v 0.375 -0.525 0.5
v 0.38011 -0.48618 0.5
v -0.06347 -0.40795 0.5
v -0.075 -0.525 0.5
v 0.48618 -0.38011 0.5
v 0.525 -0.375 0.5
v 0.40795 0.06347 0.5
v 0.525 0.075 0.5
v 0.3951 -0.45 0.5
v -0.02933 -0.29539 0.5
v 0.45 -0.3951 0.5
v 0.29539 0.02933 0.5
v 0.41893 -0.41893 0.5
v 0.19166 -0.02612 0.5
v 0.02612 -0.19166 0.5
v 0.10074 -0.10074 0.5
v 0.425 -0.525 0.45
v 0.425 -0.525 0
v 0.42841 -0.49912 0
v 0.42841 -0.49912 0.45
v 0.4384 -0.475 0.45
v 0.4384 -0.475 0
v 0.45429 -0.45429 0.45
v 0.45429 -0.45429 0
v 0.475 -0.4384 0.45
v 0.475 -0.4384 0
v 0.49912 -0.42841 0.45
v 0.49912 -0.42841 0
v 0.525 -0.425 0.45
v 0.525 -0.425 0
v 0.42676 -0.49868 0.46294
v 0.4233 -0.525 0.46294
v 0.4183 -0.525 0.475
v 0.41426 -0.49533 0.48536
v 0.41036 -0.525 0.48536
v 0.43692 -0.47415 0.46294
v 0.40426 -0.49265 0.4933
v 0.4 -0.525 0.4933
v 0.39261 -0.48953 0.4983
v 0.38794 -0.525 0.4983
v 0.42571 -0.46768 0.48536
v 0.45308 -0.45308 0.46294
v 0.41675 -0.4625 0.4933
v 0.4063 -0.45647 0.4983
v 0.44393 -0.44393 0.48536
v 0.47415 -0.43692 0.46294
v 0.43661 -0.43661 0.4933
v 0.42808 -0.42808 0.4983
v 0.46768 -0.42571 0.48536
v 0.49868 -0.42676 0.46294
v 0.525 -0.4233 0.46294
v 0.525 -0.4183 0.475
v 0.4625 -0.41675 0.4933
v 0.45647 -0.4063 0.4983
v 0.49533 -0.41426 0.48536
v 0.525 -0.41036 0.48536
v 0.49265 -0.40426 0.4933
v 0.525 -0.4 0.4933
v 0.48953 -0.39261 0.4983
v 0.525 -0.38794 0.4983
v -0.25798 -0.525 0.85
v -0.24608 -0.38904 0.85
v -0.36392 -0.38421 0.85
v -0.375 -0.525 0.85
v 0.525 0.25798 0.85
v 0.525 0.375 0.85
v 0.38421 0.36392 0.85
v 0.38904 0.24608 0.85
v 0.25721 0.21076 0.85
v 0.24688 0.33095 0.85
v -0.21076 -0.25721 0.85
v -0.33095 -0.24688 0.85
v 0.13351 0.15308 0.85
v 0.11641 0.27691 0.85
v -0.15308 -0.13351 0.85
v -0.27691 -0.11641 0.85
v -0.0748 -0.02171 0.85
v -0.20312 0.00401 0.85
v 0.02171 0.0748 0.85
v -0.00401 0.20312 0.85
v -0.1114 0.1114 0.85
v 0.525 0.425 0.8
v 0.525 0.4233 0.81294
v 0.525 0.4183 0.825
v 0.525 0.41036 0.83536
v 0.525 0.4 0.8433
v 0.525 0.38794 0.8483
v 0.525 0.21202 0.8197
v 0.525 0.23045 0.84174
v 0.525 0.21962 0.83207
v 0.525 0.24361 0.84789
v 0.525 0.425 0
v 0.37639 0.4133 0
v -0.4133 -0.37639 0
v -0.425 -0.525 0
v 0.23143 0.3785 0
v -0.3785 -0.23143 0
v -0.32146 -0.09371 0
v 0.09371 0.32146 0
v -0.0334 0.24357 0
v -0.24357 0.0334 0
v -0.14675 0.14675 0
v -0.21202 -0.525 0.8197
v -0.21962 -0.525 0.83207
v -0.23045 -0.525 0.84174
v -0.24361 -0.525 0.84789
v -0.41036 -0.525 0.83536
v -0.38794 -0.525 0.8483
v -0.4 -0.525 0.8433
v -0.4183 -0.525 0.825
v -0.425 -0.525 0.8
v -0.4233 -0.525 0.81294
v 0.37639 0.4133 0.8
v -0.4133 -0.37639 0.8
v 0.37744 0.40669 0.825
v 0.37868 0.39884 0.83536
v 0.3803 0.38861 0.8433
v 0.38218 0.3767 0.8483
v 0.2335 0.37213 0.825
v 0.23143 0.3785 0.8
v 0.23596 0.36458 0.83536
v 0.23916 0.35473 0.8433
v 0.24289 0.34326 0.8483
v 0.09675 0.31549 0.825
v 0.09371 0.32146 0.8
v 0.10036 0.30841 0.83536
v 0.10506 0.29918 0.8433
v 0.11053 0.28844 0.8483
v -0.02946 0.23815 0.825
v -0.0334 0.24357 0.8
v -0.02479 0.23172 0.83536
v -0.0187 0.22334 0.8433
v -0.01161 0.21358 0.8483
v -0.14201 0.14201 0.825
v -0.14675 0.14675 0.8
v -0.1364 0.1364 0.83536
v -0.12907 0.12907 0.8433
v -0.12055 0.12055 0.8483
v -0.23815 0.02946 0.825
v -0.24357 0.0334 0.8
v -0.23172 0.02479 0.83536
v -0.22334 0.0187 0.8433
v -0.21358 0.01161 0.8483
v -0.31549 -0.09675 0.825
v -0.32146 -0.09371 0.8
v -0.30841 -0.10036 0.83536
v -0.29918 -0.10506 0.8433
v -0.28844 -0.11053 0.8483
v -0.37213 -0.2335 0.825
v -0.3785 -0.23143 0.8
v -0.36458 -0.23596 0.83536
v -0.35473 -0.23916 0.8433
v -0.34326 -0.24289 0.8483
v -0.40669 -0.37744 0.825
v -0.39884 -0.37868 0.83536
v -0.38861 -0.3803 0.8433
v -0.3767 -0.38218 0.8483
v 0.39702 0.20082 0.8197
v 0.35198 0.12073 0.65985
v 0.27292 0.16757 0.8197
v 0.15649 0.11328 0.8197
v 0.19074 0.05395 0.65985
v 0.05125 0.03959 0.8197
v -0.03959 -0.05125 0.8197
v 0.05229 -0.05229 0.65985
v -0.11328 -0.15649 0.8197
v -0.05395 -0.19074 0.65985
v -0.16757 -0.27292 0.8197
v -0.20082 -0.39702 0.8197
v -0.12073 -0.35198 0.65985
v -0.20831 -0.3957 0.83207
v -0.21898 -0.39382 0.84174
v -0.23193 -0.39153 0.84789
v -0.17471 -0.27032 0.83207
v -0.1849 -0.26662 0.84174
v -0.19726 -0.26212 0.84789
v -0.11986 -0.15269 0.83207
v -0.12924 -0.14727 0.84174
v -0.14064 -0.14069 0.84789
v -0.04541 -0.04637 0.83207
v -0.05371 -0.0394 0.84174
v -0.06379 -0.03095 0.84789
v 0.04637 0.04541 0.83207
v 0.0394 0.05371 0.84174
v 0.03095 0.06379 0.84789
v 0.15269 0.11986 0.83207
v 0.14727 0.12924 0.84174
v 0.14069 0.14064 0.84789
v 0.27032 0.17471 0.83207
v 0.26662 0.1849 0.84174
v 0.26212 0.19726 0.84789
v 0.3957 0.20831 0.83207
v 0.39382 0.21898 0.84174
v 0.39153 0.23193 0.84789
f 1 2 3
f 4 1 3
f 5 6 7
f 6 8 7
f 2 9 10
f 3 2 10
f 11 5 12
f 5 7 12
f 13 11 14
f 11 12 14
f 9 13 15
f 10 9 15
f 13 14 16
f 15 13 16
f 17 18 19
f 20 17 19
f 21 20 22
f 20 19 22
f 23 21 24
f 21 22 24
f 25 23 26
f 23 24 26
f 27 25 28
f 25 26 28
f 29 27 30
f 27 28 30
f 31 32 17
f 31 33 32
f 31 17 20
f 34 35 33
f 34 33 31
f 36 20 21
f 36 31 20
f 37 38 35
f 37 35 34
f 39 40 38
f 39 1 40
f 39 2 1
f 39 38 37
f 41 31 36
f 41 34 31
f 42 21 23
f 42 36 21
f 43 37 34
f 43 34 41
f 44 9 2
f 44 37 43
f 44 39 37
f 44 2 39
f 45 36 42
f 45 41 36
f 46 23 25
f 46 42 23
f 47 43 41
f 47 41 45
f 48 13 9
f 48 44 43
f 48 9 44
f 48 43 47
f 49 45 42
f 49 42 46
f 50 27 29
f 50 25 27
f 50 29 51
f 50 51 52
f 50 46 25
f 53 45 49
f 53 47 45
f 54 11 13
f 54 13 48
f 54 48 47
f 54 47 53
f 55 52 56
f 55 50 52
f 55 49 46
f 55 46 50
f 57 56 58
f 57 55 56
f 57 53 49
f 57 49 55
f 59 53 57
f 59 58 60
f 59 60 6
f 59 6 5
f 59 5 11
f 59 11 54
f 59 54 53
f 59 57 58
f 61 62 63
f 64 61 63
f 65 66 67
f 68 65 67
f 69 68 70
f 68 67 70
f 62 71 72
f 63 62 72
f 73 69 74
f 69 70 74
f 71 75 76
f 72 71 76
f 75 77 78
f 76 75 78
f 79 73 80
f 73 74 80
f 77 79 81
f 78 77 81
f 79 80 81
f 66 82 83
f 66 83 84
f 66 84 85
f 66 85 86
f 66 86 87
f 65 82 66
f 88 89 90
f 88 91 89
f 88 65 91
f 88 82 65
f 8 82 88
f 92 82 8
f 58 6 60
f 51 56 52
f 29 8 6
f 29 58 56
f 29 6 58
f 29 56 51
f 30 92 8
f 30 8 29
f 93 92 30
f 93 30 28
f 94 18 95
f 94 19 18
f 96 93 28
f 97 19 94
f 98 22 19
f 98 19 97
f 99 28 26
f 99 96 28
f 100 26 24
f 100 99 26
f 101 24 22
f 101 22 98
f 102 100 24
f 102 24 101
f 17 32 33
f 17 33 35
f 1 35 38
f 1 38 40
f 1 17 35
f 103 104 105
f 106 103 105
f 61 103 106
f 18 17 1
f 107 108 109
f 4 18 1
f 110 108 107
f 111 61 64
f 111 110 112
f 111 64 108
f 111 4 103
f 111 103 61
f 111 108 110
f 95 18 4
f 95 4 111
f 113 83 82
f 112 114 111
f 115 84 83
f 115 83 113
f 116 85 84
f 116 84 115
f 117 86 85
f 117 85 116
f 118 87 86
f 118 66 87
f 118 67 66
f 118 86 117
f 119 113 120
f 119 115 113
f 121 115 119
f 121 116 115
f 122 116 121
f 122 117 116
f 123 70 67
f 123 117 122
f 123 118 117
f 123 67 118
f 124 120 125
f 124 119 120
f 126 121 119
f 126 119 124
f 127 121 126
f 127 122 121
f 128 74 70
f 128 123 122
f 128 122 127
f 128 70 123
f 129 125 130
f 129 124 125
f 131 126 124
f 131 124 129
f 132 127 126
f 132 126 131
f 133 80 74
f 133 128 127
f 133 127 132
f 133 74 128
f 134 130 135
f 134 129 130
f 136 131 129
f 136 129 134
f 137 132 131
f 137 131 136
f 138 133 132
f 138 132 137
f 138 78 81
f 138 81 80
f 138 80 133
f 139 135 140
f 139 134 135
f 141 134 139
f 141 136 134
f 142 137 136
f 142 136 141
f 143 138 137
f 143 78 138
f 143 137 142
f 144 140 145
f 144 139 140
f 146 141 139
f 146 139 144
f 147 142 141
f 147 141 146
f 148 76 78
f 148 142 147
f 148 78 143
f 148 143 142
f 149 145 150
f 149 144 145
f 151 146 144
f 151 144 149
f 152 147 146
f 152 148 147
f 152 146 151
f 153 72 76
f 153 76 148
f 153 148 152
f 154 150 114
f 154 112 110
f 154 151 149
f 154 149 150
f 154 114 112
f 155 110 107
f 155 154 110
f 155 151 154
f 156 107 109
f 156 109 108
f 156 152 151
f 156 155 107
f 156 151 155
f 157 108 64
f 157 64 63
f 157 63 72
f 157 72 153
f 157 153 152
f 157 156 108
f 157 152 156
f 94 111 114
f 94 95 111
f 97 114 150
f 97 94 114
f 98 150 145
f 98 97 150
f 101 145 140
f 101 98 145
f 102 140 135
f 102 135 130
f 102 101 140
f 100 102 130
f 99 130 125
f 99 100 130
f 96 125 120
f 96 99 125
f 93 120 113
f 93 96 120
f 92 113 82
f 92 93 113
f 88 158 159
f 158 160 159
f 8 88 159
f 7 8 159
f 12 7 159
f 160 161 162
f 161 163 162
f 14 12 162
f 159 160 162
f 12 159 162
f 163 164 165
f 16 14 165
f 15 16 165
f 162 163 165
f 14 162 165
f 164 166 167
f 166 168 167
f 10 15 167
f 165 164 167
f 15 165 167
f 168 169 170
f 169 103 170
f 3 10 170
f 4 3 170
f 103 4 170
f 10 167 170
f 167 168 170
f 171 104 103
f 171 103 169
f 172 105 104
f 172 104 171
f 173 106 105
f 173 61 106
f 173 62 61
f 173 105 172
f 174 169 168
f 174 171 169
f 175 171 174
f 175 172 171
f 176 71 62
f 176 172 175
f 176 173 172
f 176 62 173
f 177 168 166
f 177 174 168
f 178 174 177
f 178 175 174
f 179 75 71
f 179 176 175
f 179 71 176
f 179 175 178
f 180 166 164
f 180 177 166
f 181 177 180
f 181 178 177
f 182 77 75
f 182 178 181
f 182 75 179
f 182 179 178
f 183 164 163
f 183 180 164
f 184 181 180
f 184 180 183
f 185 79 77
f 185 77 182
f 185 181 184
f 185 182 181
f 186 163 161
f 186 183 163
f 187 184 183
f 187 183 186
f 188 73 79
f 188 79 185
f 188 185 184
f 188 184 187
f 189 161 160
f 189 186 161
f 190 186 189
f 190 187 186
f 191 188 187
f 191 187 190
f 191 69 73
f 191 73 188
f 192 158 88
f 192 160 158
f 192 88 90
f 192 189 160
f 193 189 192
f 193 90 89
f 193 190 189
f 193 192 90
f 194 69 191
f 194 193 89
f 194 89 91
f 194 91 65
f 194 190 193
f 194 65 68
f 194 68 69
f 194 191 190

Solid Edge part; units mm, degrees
sketch "Sketch1" plane through (0, 0, 0) normal (0, 0, 1) x (1, 0, 0)
  line L0 (0.425, -0.525) -> (-0.425, -0.525)
  arc A0 (0.525, 0.425) -> (-0.425, -0.525) centre (0.525, -0.525) ccw
  line L1 (0.525, 0.425) -> (0.525, -0.425)
  arc A1 (0.525, -0.425) -> (0.425, -0.525) centre (0.525, -0.525) ccw
  dimension "D1" = 0.525
extrude "Protrusion1" add sketch "Sketch1" along normal blind 0.5
sketch "Sketch2" plane through (0.05, -0.05, 0.5) normal (0, 0, 1) x (1, 0, 0)
  arc A0 (-0.475, -0.475) -> (0.475, 0.475) centre (0.475, -0.475) cw
  line L0 (0.475, 0.475) -> (0.475, 0.125)
  line L1 (-0.125, -0.475) -> (-0.475, -0.475)
  arc A1 (0.475, 0.125) -> (-0.125, -0.475) centre (0.475, -0.475) ccw
  dimension "D1" = 0.35
extrude "Ausprägung_2" add sketch "Sketch2" along normal blind 0.35
draft "Formschräge_2" angle 23.2 neutral plane through (0.225, -0.225, 0.5) normal (0, 0, 1) pull direction (0, 0, 1) face at (0.3788, 0.0569, 0.7882)
fillet "Verrundung_1" radius 0.05 3 edges at (-0.0053, 0.0053, 0.85) (0.4543, -0.4543, 0.5) (-0.1468, 0.1468, 0.85)
